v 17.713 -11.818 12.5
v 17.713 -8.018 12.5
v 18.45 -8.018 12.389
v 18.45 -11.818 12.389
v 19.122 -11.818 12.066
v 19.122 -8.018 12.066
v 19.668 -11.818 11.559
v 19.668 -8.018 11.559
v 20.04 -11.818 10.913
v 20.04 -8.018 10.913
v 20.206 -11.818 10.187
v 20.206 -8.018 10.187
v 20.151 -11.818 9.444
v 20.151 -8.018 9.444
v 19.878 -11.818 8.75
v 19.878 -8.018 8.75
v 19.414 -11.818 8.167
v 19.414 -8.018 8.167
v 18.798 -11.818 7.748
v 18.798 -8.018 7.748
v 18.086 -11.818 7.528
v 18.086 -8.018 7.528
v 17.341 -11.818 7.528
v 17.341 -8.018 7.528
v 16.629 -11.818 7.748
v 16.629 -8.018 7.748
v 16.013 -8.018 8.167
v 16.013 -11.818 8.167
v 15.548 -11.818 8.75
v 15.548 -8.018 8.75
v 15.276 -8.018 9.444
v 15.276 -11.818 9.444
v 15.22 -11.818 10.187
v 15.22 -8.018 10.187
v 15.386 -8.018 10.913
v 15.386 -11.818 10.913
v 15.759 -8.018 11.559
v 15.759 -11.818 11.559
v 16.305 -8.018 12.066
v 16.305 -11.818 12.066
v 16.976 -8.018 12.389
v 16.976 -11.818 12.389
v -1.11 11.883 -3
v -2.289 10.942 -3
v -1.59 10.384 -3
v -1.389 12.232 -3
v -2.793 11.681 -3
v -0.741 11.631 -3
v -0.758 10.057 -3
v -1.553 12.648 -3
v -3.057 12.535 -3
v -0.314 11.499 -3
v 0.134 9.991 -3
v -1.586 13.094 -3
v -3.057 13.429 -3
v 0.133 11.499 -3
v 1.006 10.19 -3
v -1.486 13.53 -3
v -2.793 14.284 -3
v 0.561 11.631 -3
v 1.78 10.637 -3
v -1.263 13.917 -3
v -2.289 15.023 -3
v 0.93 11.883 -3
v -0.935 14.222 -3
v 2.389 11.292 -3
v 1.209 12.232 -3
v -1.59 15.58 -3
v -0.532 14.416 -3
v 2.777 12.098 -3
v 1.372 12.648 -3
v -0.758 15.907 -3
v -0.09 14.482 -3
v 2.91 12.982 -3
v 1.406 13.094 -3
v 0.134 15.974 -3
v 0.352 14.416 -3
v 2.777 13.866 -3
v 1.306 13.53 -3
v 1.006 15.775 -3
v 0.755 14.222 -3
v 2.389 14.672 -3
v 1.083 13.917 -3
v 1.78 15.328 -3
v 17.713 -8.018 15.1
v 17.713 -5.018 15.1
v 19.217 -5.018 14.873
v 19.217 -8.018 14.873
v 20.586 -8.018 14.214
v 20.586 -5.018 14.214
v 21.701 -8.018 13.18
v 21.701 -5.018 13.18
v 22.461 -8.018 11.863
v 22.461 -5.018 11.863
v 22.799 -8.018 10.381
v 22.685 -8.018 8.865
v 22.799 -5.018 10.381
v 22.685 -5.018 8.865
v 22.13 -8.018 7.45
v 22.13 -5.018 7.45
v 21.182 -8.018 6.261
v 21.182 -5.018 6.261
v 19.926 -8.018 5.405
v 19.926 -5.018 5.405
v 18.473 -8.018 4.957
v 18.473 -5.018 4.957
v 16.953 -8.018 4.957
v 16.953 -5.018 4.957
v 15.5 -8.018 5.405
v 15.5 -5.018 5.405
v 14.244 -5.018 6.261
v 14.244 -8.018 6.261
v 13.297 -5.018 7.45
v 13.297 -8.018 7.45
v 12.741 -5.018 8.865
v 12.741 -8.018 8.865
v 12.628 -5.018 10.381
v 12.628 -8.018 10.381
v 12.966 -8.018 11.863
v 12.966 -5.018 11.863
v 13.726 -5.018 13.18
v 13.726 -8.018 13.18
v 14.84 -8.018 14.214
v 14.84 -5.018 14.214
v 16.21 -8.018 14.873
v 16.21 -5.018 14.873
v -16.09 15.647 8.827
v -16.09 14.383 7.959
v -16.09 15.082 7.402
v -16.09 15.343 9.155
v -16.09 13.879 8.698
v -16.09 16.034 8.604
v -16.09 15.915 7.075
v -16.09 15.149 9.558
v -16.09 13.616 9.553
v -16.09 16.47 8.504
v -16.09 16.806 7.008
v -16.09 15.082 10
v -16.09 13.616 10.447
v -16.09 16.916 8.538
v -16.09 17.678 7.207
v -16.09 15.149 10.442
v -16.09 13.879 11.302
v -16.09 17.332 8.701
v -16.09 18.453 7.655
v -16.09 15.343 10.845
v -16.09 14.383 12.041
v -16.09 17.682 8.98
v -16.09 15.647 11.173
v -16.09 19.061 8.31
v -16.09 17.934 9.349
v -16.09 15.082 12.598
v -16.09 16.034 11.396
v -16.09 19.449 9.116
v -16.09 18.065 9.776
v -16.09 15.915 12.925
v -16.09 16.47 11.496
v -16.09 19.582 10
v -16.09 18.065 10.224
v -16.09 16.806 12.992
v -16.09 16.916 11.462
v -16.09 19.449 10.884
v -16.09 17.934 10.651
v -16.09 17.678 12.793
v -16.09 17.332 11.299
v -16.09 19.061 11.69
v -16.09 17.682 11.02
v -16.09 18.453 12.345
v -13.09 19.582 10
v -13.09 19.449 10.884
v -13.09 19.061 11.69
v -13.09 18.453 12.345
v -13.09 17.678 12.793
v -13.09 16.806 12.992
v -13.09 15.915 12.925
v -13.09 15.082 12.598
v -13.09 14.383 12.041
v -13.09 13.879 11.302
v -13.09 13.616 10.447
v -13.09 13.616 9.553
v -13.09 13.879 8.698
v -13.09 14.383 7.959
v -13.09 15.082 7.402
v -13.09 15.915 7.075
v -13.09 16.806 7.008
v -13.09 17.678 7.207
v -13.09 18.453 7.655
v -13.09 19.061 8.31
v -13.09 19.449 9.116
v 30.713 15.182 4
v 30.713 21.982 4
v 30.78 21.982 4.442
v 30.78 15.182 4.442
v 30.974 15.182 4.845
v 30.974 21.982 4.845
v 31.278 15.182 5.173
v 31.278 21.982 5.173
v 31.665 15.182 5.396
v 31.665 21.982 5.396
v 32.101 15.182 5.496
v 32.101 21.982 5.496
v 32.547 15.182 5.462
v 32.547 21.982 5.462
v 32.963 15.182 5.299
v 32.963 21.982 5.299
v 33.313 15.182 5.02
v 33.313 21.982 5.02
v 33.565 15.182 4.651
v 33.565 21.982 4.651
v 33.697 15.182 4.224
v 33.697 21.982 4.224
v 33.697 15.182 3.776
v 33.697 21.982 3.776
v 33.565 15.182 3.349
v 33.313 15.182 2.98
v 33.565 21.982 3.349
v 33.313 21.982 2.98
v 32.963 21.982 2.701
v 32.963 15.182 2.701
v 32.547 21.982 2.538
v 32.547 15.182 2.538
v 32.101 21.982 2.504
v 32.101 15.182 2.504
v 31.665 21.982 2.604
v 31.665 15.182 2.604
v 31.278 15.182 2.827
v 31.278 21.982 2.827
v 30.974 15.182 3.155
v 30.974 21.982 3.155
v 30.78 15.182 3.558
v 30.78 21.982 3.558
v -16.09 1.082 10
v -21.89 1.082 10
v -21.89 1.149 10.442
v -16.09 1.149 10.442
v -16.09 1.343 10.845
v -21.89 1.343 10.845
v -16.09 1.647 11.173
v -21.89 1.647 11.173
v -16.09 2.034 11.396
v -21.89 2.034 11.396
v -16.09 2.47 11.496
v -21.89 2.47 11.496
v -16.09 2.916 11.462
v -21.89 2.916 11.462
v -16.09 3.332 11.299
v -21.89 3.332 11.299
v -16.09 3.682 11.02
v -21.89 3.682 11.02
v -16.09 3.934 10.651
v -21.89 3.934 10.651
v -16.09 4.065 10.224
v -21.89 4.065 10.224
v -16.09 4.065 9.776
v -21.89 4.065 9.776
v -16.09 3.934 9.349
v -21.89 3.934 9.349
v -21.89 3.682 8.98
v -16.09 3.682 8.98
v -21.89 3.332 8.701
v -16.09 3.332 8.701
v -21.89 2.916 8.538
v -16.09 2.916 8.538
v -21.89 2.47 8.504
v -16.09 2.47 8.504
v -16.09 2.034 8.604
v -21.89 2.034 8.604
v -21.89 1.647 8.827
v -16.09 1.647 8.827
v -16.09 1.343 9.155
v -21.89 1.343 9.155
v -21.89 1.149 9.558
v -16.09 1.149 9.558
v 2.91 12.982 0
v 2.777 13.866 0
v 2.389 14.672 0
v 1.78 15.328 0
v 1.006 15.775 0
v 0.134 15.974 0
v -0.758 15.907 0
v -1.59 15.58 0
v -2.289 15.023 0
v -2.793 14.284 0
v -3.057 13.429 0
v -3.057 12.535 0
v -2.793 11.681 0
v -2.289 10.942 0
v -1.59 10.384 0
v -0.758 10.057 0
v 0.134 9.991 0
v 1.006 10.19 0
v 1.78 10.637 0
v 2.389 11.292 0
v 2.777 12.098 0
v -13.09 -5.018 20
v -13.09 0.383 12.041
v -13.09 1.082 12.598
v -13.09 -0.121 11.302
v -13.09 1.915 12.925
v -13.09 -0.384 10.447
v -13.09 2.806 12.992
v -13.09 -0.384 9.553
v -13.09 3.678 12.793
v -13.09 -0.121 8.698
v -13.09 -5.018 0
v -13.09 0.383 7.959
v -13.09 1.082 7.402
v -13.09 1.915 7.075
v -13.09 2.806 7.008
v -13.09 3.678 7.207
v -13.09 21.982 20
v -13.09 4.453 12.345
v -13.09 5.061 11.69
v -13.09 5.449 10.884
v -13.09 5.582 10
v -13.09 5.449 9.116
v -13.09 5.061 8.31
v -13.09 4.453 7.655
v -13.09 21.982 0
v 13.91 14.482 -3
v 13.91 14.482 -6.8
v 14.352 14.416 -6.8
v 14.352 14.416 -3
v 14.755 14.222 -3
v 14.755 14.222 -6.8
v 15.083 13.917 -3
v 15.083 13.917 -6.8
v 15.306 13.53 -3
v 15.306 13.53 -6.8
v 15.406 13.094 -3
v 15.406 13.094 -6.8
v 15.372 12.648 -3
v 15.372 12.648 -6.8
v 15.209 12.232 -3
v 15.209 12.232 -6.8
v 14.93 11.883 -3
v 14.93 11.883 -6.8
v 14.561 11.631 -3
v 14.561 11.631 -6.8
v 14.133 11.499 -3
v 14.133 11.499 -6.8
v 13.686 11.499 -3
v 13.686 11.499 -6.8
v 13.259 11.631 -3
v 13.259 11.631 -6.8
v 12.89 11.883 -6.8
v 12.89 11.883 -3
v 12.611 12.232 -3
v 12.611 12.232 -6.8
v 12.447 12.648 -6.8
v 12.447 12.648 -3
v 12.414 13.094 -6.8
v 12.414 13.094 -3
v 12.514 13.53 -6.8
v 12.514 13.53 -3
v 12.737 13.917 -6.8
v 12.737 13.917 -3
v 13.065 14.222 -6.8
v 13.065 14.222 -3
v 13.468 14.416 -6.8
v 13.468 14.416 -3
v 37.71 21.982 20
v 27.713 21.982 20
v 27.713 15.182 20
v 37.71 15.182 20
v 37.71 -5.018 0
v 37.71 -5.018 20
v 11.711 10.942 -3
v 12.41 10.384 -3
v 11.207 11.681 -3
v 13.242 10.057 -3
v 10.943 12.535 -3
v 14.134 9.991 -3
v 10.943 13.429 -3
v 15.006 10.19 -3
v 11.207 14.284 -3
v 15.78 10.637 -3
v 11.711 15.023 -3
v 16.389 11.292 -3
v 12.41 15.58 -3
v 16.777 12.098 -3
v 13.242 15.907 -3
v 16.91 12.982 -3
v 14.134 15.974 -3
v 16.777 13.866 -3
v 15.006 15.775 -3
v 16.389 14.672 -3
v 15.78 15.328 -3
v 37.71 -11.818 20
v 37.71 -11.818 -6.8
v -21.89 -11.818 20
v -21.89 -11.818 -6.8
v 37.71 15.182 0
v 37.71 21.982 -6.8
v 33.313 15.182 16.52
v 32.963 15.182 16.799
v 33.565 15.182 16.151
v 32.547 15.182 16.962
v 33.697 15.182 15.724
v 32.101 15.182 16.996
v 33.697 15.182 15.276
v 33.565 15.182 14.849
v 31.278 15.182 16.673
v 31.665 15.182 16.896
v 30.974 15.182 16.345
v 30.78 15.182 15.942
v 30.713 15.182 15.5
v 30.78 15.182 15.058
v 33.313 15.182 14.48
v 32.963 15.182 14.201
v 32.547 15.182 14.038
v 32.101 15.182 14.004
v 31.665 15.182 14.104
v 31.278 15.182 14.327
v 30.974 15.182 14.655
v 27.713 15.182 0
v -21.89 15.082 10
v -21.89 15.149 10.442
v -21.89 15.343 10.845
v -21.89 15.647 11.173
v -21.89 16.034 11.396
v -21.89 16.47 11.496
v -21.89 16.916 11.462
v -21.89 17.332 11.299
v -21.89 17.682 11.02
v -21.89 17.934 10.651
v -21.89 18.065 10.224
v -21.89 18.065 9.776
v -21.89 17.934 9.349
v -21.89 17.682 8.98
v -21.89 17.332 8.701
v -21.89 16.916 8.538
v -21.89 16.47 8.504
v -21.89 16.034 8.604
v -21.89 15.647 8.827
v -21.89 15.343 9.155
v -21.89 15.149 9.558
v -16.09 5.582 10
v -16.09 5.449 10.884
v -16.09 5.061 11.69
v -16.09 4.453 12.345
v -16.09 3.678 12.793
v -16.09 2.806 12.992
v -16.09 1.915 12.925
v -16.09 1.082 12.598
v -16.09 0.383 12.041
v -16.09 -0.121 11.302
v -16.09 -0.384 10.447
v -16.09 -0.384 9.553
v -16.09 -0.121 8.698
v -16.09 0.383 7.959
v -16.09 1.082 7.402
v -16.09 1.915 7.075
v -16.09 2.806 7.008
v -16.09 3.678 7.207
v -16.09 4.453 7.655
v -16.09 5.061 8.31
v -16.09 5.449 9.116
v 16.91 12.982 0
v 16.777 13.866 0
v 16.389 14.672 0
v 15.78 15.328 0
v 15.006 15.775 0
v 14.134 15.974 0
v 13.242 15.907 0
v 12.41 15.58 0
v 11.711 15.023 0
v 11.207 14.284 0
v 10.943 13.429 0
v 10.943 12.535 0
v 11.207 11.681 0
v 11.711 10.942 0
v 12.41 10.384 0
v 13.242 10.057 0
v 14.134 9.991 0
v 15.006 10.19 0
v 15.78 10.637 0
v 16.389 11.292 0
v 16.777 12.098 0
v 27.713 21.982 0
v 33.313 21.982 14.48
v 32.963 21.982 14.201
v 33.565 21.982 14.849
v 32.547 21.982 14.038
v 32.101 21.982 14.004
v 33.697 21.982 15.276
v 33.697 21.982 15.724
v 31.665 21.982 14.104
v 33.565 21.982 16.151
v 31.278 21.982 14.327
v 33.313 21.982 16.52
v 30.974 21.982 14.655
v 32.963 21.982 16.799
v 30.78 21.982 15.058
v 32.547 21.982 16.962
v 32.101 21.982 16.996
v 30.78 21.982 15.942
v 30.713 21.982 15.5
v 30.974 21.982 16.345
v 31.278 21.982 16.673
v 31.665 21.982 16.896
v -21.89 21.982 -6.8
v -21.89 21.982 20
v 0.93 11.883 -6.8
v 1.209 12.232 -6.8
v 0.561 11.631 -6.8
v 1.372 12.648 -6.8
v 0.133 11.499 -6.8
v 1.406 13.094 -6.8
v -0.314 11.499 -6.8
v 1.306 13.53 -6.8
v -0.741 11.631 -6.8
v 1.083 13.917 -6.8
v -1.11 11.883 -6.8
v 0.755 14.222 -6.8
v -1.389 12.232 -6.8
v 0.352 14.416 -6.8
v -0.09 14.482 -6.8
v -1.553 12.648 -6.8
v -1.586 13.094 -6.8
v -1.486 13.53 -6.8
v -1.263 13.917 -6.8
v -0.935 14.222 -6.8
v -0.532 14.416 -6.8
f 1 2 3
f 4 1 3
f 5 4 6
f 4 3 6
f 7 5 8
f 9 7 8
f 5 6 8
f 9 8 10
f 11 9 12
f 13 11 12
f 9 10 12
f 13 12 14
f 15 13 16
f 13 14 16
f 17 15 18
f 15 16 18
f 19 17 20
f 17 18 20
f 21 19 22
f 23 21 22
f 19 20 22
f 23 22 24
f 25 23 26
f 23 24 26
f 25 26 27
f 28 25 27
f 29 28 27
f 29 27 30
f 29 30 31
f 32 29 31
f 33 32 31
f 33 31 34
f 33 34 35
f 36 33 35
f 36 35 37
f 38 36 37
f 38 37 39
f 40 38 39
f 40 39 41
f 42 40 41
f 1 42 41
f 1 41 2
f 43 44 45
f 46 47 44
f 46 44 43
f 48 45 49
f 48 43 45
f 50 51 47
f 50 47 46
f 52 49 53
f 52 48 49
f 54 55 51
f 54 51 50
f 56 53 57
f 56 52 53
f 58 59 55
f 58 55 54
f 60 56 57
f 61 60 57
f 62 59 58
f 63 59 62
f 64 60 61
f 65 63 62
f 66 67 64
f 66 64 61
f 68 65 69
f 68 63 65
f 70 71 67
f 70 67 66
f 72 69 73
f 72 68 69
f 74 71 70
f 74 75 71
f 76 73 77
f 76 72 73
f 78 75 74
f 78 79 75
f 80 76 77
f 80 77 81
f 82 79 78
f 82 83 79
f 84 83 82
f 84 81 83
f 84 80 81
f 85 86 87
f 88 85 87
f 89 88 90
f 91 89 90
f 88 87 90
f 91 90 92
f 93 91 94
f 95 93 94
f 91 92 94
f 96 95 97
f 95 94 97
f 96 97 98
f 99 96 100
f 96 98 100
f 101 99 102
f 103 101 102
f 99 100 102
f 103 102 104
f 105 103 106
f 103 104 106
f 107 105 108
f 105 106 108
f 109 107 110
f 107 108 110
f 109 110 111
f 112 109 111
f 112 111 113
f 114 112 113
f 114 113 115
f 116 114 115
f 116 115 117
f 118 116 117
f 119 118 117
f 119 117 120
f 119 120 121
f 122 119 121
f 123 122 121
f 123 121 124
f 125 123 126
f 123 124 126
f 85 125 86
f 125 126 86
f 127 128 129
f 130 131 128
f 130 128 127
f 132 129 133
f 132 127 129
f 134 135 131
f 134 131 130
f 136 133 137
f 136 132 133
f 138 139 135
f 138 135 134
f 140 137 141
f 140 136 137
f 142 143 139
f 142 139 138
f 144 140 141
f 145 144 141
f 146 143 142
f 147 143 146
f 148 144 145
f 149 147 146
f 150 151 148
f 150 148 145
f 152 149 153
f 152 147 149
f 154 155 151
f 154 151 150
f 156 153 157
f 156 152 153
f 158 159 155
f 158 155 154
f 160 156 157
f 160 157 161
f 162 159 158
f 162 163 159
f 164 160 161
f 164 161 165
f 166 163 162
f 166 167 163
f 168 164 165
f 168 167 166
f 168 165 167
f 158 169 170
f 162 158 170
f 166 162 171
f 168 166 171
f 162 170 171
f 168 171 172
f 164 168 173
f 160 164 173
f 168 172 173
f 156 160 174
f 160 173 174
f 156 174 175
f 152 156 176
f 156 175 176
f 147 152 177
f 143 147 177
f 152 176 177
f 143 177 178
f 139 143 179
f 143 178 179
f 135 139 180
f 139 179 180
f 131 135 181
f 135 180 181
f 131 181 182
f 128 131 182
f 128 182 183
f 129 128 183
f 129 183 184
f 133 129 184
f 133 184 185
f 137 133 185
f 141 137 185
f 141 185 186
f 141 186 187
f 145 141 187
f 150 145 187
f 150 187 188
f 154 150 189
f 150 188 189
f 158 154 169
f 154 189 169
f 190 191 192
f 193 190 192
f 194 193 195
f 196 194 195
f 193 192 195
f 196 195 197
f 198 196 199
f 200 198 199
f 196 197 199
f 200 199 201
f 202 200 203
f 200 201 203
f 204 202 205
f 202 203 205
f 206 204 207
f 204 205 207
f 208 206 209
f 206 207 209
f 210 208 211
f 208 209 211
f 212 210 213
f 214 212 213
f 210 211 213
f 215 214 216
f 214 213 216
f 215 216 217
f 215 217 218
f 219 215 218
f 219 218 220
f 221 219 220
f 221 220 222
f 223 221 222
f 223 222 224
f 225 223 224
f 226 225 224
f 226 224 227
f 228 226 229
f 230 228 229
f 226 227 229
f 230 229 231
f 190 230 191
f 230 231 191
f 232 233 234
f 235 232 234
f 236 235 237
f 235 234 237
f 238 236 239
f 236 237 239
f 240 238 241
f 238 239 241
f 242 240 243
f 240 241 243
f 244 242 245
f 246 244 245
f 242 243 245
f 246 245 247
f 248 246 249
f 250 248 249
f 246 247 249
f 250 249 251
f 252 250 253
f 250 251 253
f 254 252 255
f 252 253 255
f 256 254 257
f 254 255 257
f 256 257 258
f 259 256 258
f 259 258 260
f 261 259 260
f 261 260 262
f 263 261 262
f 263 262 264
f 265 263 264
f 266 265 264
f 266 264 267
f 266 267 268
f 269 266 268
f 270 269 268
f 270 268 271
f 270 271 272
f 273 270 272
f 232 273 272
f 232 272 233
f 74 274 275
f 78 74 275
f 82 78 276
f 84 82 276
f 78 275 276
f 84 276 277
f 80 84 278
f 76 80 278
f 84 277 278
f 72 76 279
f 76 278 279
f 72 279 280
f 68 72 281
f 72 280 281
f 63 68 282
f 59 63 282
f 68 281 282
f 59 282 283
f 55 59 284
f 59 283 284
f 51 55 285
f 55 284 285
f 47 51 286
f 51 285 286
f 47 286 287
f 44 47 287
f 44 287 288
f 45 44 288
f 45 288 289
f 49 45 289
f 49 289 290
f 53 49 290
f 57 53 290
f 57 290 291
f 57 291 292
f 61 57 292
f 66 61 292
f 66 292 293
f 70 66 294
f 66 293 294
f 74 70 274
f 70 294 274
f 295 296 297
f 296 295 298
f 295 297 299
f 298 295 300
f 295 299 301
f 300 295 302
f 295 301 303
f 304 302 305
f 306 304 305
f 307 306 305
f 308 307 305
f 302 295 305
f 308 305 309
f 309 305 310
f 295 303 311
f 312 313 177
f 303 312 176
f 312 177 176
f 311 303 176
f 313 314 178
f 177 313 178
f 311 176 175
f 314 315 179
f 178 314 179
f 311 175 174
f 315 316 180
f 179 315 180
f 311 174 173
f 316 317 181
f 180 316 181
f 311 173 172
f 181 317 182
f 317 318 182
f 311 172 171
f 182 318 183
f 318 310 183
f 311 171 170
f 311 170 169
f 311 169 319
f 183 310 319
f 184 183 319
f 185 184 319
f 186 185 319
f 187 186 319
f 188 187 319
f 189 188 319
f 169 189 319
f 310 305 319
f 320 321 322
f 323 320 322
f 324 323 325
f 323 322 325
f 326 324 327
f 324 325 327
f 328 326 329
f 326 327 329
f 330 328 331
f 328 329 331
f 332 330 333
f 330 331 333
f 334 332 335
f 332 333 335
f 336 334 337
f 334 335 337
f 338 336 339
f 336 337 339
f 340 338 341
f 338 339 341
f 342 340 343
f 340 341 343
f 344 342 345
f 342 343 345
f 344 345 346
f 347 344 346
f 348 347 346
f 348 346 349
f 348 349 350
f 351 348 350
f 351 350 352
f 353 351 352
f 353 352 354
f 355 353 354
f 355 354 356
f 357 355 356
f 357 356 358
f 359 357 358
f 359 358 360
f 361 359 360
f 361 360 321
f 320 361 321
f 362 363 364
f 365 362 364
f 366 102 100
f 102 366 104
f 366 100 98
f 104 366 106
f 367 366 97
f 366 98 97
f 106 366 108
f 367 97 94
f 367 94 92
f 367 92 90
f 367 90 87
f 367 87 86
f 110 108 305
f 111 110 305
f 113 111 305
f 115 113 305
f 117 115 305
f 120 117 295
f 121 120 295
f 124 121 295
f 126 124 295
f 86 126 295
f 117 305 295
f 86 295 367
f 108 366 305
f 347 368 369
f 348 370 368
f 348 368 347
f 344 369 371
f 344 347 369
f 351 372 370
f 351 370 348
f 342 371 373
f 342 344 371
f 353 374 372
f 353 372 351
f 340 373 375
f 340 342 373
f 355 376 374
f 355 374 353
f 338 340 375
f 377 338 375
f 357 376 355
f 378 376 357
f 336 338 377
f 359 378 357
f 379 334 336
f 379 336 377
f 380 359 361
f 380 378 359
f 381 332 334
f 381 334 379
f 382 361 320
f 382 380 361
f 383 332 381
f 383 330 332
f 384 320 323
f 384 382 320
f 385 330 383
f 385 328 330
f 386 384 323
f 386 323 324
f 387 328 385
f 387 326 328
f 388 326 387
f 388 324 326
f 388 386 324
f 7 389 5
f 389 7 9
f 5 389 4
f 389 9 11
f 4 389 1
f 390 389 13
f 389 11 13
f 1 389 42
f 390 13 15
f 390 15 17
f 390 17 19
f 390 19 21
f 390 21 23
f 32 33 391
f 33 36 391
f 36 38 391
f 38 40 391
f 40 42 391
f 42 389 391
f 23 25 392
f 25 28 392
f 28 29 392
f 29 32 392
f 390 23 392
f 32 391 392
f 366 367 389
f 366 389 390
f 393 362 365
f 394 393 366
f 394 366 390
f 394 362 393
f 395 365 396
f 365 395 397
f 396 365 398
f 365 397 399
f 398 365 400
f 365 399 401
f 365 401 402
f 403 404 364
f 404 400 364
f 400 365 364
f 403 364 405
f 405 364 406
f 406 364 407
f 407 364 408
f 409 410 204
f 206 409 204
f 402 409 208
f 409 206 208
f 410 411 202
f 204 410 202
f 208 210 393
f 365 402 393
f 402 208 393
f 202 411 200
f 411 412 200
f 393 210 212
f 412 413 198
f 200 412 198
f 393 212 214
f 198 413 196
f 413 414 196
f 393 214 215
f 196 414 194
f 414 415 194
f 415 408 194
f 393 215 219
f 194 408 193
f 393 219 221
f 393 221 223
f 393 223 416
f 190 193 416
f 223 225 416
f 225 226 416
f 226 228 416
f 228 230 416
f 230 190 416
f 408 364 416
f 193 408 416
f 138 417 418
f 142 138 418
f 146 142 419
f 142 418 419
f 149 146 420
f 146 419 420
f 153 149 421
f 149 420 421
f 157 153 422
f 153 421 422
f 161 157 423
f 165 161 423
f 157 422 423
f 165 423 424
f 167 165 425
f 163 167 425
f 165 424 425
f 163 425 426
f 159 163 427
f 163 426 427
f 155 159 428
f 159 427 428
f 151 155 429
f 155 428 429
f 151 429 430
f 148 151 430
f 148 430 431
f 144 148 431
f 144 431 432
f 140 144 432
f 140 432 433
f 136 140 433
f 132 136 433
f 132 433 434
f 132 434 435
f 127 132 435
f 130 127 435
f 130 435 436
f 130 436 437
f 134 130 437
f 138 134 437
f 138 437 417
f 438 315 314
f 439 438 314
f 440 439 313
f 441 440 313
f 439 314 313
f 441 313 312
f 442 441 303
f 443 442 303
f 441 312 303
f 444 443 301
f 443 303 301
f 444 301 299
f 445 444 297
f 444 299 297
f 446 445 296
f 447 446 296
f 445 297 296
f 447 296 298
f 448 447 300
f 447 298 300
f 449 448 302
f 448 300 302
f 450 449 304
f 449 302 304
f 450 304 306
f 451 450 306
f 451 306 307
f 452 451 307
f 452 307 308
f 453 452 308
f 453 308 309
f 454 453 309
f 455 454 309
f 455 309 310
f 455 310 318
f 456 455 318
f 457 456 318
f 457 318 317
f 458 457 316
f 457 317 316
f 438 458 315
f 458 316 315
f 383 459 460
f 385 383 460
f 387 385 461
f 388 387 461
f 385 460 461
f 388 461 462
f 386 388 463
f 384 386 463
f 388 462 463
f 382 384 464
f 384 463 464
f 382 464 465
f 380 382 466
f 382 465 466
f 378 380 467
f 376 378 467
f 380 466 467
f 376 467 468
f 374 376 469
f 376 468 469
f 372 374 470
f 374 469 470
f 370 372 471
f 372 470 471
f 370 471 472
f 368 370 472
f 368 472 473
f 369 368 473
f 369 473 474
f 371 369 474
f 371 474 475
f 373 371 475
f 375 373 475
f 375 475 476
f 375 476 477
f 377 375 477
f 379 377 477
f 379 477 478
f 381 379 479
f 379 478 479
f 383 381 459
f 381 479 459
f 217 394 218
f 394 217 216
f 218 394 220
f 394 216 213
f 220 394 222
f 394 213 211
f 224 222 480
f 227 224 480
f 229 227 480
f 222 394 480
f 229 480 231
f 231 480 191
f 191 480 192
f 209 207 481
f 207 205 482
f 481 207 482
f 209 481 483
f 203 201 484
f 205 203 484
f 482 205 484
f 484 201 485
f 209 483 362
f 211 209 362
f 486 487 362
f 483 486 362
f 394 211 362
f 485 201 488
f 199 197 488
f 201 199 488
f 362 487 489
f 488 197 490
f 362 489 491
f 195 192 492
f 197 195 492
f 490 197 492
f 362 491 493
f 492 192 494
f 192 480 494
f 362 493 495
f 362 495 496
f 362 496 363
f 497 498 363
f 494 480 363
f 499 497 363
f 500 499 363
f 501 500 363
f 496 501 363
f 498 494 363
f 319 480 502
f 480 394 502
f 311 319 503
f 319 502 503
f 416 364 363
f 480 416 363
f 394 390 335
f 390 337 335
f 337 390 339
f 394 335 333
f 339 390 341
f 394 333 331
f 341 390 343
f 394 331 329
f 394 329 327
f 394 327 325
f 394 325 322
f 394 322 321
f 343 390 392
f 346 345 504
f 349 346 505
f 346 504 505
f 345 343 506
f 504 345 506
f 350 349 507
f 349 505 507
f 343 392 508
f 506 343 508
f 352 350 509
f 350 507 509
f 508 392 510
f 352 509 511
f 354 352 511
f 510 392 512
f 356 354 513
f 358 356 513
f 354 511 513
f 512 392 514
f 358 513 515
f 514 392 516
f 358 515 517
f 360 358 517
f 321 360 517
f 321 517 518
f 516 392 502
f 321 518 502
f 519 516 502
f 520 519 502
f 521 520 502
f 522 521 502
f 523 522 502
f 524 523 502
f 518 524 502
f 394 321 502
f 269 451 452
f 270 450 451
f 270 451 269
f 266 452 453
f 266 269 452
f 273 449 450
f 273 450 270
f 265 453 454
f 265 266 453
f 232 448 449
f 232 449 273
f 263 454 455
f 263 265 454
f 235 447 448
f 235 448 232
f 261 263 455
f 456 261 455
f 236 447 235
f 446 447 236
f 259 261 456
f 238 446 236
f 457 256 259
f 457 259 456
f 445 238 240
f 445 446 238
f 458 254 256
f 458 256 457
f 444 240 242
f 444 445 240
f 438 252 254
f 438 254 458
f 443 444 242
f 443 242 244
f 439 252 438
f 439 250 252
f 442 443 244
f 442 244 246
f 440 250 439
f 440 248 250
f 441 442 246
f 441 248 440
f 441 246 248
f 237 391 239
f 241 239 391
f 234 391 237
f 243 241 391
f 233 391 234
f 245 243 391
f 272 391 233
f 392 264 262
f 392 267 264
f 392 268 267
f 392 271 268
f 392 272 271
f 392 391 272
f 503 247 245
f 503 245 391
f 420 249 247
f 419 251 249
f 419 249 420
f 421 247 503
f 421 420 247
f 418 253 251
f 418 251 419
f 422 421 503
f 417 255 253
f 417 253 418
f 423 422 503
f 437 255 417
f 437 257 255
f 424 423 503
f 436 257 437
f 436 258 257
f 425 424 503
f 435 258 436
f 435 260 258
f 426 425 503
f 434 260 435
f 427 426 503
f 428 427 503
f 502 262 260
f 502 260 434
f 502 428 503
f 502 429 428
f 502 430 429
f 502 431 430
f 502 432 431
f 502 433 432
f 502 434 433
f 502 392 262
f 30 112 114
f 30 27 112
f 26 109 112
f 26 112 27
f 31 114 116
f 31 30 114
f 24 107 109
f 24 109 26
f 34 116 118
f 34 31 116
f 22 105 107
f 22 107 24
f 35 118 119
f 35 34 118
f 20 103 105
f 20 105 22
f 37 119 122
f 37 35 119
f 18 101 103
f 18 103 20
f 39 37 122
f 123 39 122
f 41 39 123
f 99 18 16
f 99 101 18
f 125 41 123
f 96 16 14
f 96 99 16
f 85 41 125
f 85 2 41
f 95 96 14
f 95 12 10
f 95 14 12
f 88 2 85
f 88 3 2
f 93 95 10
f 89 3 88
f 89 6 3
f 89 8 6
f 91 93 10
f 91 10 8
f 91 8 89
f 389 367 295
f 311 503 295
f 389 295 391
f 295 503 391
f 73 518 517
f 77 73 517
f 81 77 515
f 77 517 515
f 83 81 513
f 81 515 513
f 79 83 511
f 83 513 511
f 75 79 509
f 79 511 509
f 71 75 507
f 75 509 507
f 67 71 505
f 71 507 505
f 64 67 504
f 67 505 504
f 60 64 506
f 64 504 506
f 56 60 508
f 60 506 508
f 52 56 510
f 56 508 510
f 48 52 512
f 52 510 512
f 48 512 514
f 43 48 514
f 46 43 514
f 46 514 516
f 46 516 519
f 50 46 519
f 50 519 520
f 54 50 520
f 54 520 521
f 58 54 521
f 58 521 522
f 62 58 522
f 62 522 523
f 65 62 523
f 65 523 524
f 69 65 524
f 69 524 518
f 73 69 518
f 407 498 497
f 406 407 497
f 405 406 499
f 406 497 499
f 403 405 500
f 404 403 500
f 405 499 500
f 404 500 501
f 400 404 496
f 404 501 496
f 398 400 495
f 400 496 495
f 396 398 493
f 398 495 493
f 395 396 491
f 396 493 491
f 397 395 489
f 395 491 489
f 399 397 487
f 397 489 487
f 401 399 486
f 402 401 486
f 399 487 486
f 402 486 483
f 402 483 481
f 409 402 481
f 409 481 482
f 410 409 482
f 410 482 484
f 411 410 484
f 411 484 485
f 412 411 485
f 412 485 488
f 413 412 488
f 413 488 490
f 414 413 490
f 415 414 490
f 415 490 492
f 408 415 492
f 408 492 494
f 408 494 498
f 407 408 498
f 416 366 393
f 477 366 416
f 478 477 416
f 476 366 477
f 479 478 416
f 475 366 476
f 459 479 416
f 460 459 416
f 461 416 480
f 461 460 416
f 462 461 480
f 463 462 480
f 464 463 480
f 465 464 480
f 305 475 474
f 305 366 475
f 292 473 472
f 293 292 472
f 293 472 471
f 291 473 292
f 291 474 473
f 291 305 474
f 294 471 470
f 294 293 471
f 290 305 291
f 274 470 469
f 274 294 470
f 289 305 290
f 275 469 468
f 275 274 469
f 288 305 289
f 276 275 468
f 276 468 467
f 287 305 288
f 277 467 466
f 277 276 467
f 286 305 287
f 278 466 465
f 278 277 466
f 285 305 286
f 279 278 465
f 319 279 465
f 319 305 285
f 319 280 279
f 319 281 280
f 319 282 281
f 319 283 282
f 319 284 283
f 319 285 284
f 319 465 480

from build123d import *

# Parameters (mm, degrees)
BOSS_EXTRUDE2_DEPTH  = 20
SKETCH4_W            = 6.8
SKETCH4_H            = 33.8
BOSS_EXTRUDE3_DEPTH  = 53.6
SKETCH8_W            = 20
SKETCH8_H            = 20.2
CUT_EXTRUDE1_DEPTH   = 53.6
SKETCH9_R            = 5
CUT_EXTRUDE3_DEPTH   = 3
SKETCH11_R           = 2.5
CUT_EXTRUDE4_DEPTH   = 20
SKETCH12_R           = 1.1
CUT_EXTRUDE6_DEPTH   = 20
SKETCH13_W           = 2
SKETCH13_H           = 26.8
BOSS_EXTRUDE4_DEPTH  = 33.8
SKETCH16_R           = 1.1
CUT_EXTRUDE7_DEPTH   = 20
SKETCH17_W           = 2
SKETCH17_H           = 26.8
BOSS_EXTRUDE5_DEPTH  = 33.8
SKETCH18_W           = 20
SKETCH18_H           = 20.2
CUT_EXTRUDE9_DEPTH   = 60
SKETCH19_W           = 20
SKETCH19_H           = 20.2
CUT_EXTRUDE10_DEPTH  = 60
SKETCH20_W           = 8.8
SKETCH20_H           = 20.2
BOSS_EXTRUDE6_DEPTH  = 20
SKETCH21_R           = 1.1
BOSS_EXTRUDE7_DEPTH  = 13.6
SKETCH23_R           = 1.1
BOSS_EXTRUDE8_DEPTH  = 13.6
SKETCH24_R           = 1.125173923
BOSS_EXTRUDE9_DEPTH  = 6.8
SKETCH25_R           = 1.1
SKETCH25_R_2         = 1.440897936
BOSS_EXTRUDE10_DEPTH = 6.8
SKETCH26_R           = 1.5
CUT_EXTRUDE11_DEPTH  = 10
SKETCH27_R           = 1.5
CUT_EXTRUDE12_DEPTH  = 10
SKETCH29_R           = 1.5
CUT_EXTRUDE15_DEPTH  = 10
SKETCH31_R           = 3
CUT_EXTRUDE16_DEPTH  = 3
SKETCH32_R           = 3
CUT_EXTRUDE17_DEPTH  = 3
SKETCH33_R           = 5.1
CUT_EXTRUDE18_DEPTH  = 3
SKETCH35_W           = 6.8
SKETCH35_H           = 20.2
BOSS_EXTRUDE11_DEPTH = 2
SKETCH36_R           = 2.5
BOSS_EXTRUDE13_DEPTH = 6.8
SKETCH37_R           = 1.5
CUT_EXTRUDE19_DEPTH  = 6.8


with BuildPart() as part:
    # Sketch1 → Boss-Extrude2 (new body)
    with BuildSketch(Plane.XY):
        Polygon((-13.090120482, -4.867831325), (27.713257426, -4.867831325), (27.713257426, 21.982168675), (34.513257426, 21.982168675), (34.513257426, -5.017831325), (34.513257426, -11.817831325), (-19.890120482, -11.817831325), (-19.890120482, -5.017831325), (-19.890120482, 21.982168675), (-13.090120482, 21.982168675), align=None)
    extrude(amount=BOSS_EXTRUDE2_DEPTH)

    # Sketch4 → Boss-Extrude3 (add)
    with BuildSketch(Plane.ZY.offset(19.890120482)):
        with Locations((-3.4, 5.082168675)):
            Rectangle(SKETCH4_W, SKETCH4_H)
    extrude(amount=-BOSS_EXTRUDE3_DEPTH)

    # Sketch8 → Cut-Extrude1 (cut)
    with BuildSketch(Plane(origin=(34.513257426, 0, 0), x_dir=(0, 0, -1), z_dir=(1, 0, 0))):
        with Locations((-10, 5.082168675)):
            Rectangle(SKETCH8_W, SKETCH8_H)
    extrude(amount=-CUT_EXTRUDE1_DEPTH, mode=Mode.SUBTRACT)

    # Sketch9 → Cut-Extrude3 (cut)
    with BuildSketch(Plane(origin=(0, -5.017831325, 0), x_dir=(1, 0, 0), z_dir=(0, 1, 0))):
        with Locations(Location((17.713257426, -10, 0), (0, 0, 270))):
            Circle(SKETCH9_R)
    extrude(amount=-CUT_EXTRUDE3_DEPTH, mode=Mode.SUBTRACT)

    # Sketch11 → Cut-Extrude4 (cut)
    with BuildSketch(Plane(origin=(0, -8.017831325, 0), x_dir=(1, 0, 0), z_dir=(0, 1, 0))):
        with Locations(Location((17.713257426, -10, 0), (0, 0, 270))):
            Circle(SKETCH11_R)
    extrude(amount=-CUT_EXTRUDE4_DEPTH, mode=Mode.SUBTRACT)

    # Sketch12 → Cut-Extrude6 (cut)
    with BuildSketch(Plane(origin=(0, 21.982168675, 0), x_dir=(1, 0, 0), z_dir=(0, 1, 0))):
        with Locations(Location((32.513257426, -15.3, 0), (0, 0, 180))):
            Circle(SKETCH12_R)
        with Locations(Location((31.709879518, -4.7, 0), (0, 0, 180))):
            Circle(SKETCH12_R)
    extrude(amount=-CUT_EXTRUDE6_DEPTH, mode=Mode.SUBTRACT)

    # Sketch13 → Boss-Extrude4 (add)
    with BuildSketch(Plane(origin=(0, 21.982168675, 0), x_dir=(1, 0, 0), z_dir=(0, 1, 0))):
        with Locations((34.709879518, -6.6)):
            Rectangle(SKETCH13_W, SKETCH13_H)
    extrude(amount=-BOSS_EXTRUDE4_DEPTH)

    # Sketch16 → Cut-Extrude7 (cut)
    with BuildSketch(Plane(origin=(0, 21.982168675, 0), x_dir=(1, 0, 0), z_dir=(0, 1, 0))):
        with Locations(Location((-17.890120482, -15.3, 0), (0, 0, 180))):
            Circle(SKETCH16_R)
        with Locations(Location((-17.890120482, -4.7, 0), (0, 0, 180))):
            Circle(SKETCH16_R)
    extrude(amount=-CUT_EXTRUDE7_DEPTH, mode=Mode.SUBTRACT)

    # Sketch17 → Boss-Extrude5 (add)
    with BuildSketch(Plane(origin=(0, 21.982168675, 0), x_dir=(1, 0, 0), z_dir=(0, 1, 0))):
        with Locations((-20.890120482, -6.6)):
            Rectangle(SKETCH17_W, SKETCH17_H)
    extrude(amount=-BOSS_EXTRUDE5_DEPTH)

    # Sketch18 → Cut-Extrude9 (cut)
    with BuildSketch(Plane.ZY.offset(-33.709879518)):
        with Locations((10, 5.082168675)):
            Rectangle(SKETCH18_W, SKETCH18_H)
    extrude(amount=CUT_EXTRUDE9_DEPTH, mode=Mode.SUBTRACT)

    # Sketch19 → Cut-Extrude10 (cut)
    with BuildSketch(Plane.ZY.offset(-33.709879518)):
        with Locations((10, 5.082168675)):
            Rectangle(SKETCH19_W, SKETCH19_H)
    extrude(amount=-CUT_EXTRUDE10_DEPTH, mode=Mode.SUBTRACT)

    # Sketch20 → Boss-Extrude6 (add)
    with BuildSketch(Plane.XY):
        with Locations((-17.490120482, 5.082168675)):
            Rectangle(SKETCH20_W, SKETCH20_H)
    extrude(amount=BOSS_EXTRUDE6_DEPTH)

    # Sketch21 → Boss-Extrude7 (add)
    with BuildSketch(Plane(origin=(0, 21.982168675, 0), x_dir=(1, 0, 0), z_dir=(0, 1, 0))):
        with Locations((-17.890120482, -4.7)):
            Circle(SKETCH21_R)
    extrude(amount=-BOSS_EXTRUDE7_DEPTH)

    # Sketch23 → Boss-Extrude8 (add)
    with BuildSketch(Plane(origin=(0, 21.982168675, 0), x_dir=(1, 0, 0), z_dir=(0, 1, 0))):
        with Locations((-17.890120482, -15.3)):
            Circle(SKETCH23_R)
    extrude(amount=-BOSS_EXTRUDE8_DEPTH)

    # Sketch24 → Boss-Extrude9 (add)
    with BuildSketch(Plane(origin=(0, 21.982168675, 0), x_dir=(1, 0, 0), z_dir=(0, 1, 0))):
        with Locations((32.513257426, -15.3)):
            Circle(SKETCH24_R)
    extrude(amount=-BOSS_EXTRUDE9_DEPTH)

    # Sketch25 → Boss-Extrude10 (add)
    with BuildSketch(Plane(origin=(0, 21.982168675, 0), x_dir=(1, 0, 0), z_dir=(0, 1, 0))):
        with Locations((29.715206423, -15.150513528)):
            Circle(SKETCH25_R)
        with Locations((31.709879518, -4.7)):
            Circle(SKETCH25_R_2)
    extrude(amount=-BOSS_EXTRUDE10_DEPTH)

    # Sketch26 → Cut-Extrude11 (cut)
    with BuildSketch(Plane(origin=(0, 21.982168675, 0), x_dir=(1, 0, 0), z_dir=(0, 1, 0))):
        with Locations(Location((32.213257426, -4.5, 0), (0, 0, 180))):
            Circle(SKETCH26_R)
        with Locations(Location((32.213257426, -15.5, 0), (0, 0, 180))):
            Circle(SKETCH26_R)
    extrude(amount=-CUT_EXTRUDE11_DEPTH, mode=Mode.SUBTRACT)

    # Sketch27 → Cut-Extrude12 (cut)
    with BuildSketch(Plane(origin=(0, 0, -6.8), x_dir=(-1, 0, 0), z_dir=(0, 0, -1))):
        with Locations(Location((-13.909879518, 12.982168675, 0), (0, 0, 90))):
            Circle(SKETCH27_R)
        with Locations(Location((0.090120482, 12.982168675, 0), (0, 0, 90))):
            Circle(SKETCH27_R)
    extrude(amount=-CUT_EXTRUDE12_DEPTH, mode=Mode.SUBTRACT)

    # Sketch29 → Cut-Extrude15 (cut)
    with BuildSketch(Plane.ZY.offset(21.890120482)):
        with Locations(Location((10, 2.582168675, 0), (0, 0, 270))):
            Circle(SKETCH29_R)
        with Locations(Location((10, 16.582168675, 0), (0, 0, 270))):
            Circle(SKETCH29_R)
    extrude(amount=-CUT_EXTRUDE15_DEPTH, mode=Mode.SUBTRACT)

    # Sketch31 → Cut-Extrude16 (cut)
    with BuildSketch(Plane(origin=(-13.090120482, 0, 0), x_dir=(0, 0, -1), z_dir=(1, 0, 0))):
        with Locations(Location((-10, 2.582168675, 0), (0, 0, 90))):
            Circle(SKETCH31_R)
        with Locations(Location((-10, 16.582168675, 0), (0, 0, 90))):
            Circle(SKETCH31_R)
    extrude(amount=-CUT_EXTRUDE16_DEPTH, mode=Mode.SUBTRACT)

    # Sketch32 → Cut-Extrude17 (cut)
    with BuildSketch(Plane.XY):
        with Locations((-0.090120482, 12.982168675)):
            Circle(SKETCH32_R)
        with Locations((13.909879518, 12.982168675)):
            Circle(SKETCH32_R)
    extrude(amount=-CUT_EXTRUDE17_DEPTH, mode=Mode.SUBTRACT)

    # Sketch33 → Cut-Extrude18 (cut)
    with BuildSketch(Plane(origin=(0, -5.017831325, 0), x_dir=(1, 0, 0), z_dir=(0, 1, 0))):
        with Locations(Location((17.713257426, -10, 0), (0, 0, 270))):
            Circle(SKETCH33_R)
    extrude(amount=-CUT_EXTRUDE18_DEPTH, mode=Mode.SUBTRACT)

    # Sketch35 → Boss-Extrude11 (add)
    with BuildSketch(Plane(origin=(35.709879518, 0, 0), x_dir=(0, 0, -1), z_dir=(1, 0, 0))):
        Polygon((-20, 21.982168675), (-20, 15.182168675), (0, 15.182168675), (6.8, 15.182168675), (6.8, 21.982168675), align=None)
        with Locations((3.4, 5.082168675)):
            Rectangle(SKETCH35_W, SKETCH35_H)
        Polygon((6.8, -5.017831325), (0, -5.017831325), (-20, -5.017831325), (-20, -11.817831325), (6.8, -11.817831325), align=None)
    extrude(amount=BOSS_EXTRUDE11_DEPTH)

    # Sketch36 → Boss-Extrude13 (add)
    with BuildSketch(Plane(origin=(0, 21.982168675, 0), x_dir=(1, 0, 0), z_dir=(0, 1, 0))):
        with Locations((31.713257426, -4)):
            Circle(SKETCH36_R)
    extrude(amount=-BOSS_EXTRUDE13_DEPTH)

    # Sketch37 → Cut-Extrude19 (cut)
    with BuildSketch(Plane(origin=(0, 21.982168675, 0), x_dir=(1, 0, 0), z_dir=(0, 1, 0))):
        with Locations(Location((32.213257426, -4, 0), (0, 0, 180))):
            Circle(SKETCH37_R)
    extrude(amount=-CUT_EXTRUDE19_DEPTH, mode=Mode.SUBTRACT)


solid = part.part
